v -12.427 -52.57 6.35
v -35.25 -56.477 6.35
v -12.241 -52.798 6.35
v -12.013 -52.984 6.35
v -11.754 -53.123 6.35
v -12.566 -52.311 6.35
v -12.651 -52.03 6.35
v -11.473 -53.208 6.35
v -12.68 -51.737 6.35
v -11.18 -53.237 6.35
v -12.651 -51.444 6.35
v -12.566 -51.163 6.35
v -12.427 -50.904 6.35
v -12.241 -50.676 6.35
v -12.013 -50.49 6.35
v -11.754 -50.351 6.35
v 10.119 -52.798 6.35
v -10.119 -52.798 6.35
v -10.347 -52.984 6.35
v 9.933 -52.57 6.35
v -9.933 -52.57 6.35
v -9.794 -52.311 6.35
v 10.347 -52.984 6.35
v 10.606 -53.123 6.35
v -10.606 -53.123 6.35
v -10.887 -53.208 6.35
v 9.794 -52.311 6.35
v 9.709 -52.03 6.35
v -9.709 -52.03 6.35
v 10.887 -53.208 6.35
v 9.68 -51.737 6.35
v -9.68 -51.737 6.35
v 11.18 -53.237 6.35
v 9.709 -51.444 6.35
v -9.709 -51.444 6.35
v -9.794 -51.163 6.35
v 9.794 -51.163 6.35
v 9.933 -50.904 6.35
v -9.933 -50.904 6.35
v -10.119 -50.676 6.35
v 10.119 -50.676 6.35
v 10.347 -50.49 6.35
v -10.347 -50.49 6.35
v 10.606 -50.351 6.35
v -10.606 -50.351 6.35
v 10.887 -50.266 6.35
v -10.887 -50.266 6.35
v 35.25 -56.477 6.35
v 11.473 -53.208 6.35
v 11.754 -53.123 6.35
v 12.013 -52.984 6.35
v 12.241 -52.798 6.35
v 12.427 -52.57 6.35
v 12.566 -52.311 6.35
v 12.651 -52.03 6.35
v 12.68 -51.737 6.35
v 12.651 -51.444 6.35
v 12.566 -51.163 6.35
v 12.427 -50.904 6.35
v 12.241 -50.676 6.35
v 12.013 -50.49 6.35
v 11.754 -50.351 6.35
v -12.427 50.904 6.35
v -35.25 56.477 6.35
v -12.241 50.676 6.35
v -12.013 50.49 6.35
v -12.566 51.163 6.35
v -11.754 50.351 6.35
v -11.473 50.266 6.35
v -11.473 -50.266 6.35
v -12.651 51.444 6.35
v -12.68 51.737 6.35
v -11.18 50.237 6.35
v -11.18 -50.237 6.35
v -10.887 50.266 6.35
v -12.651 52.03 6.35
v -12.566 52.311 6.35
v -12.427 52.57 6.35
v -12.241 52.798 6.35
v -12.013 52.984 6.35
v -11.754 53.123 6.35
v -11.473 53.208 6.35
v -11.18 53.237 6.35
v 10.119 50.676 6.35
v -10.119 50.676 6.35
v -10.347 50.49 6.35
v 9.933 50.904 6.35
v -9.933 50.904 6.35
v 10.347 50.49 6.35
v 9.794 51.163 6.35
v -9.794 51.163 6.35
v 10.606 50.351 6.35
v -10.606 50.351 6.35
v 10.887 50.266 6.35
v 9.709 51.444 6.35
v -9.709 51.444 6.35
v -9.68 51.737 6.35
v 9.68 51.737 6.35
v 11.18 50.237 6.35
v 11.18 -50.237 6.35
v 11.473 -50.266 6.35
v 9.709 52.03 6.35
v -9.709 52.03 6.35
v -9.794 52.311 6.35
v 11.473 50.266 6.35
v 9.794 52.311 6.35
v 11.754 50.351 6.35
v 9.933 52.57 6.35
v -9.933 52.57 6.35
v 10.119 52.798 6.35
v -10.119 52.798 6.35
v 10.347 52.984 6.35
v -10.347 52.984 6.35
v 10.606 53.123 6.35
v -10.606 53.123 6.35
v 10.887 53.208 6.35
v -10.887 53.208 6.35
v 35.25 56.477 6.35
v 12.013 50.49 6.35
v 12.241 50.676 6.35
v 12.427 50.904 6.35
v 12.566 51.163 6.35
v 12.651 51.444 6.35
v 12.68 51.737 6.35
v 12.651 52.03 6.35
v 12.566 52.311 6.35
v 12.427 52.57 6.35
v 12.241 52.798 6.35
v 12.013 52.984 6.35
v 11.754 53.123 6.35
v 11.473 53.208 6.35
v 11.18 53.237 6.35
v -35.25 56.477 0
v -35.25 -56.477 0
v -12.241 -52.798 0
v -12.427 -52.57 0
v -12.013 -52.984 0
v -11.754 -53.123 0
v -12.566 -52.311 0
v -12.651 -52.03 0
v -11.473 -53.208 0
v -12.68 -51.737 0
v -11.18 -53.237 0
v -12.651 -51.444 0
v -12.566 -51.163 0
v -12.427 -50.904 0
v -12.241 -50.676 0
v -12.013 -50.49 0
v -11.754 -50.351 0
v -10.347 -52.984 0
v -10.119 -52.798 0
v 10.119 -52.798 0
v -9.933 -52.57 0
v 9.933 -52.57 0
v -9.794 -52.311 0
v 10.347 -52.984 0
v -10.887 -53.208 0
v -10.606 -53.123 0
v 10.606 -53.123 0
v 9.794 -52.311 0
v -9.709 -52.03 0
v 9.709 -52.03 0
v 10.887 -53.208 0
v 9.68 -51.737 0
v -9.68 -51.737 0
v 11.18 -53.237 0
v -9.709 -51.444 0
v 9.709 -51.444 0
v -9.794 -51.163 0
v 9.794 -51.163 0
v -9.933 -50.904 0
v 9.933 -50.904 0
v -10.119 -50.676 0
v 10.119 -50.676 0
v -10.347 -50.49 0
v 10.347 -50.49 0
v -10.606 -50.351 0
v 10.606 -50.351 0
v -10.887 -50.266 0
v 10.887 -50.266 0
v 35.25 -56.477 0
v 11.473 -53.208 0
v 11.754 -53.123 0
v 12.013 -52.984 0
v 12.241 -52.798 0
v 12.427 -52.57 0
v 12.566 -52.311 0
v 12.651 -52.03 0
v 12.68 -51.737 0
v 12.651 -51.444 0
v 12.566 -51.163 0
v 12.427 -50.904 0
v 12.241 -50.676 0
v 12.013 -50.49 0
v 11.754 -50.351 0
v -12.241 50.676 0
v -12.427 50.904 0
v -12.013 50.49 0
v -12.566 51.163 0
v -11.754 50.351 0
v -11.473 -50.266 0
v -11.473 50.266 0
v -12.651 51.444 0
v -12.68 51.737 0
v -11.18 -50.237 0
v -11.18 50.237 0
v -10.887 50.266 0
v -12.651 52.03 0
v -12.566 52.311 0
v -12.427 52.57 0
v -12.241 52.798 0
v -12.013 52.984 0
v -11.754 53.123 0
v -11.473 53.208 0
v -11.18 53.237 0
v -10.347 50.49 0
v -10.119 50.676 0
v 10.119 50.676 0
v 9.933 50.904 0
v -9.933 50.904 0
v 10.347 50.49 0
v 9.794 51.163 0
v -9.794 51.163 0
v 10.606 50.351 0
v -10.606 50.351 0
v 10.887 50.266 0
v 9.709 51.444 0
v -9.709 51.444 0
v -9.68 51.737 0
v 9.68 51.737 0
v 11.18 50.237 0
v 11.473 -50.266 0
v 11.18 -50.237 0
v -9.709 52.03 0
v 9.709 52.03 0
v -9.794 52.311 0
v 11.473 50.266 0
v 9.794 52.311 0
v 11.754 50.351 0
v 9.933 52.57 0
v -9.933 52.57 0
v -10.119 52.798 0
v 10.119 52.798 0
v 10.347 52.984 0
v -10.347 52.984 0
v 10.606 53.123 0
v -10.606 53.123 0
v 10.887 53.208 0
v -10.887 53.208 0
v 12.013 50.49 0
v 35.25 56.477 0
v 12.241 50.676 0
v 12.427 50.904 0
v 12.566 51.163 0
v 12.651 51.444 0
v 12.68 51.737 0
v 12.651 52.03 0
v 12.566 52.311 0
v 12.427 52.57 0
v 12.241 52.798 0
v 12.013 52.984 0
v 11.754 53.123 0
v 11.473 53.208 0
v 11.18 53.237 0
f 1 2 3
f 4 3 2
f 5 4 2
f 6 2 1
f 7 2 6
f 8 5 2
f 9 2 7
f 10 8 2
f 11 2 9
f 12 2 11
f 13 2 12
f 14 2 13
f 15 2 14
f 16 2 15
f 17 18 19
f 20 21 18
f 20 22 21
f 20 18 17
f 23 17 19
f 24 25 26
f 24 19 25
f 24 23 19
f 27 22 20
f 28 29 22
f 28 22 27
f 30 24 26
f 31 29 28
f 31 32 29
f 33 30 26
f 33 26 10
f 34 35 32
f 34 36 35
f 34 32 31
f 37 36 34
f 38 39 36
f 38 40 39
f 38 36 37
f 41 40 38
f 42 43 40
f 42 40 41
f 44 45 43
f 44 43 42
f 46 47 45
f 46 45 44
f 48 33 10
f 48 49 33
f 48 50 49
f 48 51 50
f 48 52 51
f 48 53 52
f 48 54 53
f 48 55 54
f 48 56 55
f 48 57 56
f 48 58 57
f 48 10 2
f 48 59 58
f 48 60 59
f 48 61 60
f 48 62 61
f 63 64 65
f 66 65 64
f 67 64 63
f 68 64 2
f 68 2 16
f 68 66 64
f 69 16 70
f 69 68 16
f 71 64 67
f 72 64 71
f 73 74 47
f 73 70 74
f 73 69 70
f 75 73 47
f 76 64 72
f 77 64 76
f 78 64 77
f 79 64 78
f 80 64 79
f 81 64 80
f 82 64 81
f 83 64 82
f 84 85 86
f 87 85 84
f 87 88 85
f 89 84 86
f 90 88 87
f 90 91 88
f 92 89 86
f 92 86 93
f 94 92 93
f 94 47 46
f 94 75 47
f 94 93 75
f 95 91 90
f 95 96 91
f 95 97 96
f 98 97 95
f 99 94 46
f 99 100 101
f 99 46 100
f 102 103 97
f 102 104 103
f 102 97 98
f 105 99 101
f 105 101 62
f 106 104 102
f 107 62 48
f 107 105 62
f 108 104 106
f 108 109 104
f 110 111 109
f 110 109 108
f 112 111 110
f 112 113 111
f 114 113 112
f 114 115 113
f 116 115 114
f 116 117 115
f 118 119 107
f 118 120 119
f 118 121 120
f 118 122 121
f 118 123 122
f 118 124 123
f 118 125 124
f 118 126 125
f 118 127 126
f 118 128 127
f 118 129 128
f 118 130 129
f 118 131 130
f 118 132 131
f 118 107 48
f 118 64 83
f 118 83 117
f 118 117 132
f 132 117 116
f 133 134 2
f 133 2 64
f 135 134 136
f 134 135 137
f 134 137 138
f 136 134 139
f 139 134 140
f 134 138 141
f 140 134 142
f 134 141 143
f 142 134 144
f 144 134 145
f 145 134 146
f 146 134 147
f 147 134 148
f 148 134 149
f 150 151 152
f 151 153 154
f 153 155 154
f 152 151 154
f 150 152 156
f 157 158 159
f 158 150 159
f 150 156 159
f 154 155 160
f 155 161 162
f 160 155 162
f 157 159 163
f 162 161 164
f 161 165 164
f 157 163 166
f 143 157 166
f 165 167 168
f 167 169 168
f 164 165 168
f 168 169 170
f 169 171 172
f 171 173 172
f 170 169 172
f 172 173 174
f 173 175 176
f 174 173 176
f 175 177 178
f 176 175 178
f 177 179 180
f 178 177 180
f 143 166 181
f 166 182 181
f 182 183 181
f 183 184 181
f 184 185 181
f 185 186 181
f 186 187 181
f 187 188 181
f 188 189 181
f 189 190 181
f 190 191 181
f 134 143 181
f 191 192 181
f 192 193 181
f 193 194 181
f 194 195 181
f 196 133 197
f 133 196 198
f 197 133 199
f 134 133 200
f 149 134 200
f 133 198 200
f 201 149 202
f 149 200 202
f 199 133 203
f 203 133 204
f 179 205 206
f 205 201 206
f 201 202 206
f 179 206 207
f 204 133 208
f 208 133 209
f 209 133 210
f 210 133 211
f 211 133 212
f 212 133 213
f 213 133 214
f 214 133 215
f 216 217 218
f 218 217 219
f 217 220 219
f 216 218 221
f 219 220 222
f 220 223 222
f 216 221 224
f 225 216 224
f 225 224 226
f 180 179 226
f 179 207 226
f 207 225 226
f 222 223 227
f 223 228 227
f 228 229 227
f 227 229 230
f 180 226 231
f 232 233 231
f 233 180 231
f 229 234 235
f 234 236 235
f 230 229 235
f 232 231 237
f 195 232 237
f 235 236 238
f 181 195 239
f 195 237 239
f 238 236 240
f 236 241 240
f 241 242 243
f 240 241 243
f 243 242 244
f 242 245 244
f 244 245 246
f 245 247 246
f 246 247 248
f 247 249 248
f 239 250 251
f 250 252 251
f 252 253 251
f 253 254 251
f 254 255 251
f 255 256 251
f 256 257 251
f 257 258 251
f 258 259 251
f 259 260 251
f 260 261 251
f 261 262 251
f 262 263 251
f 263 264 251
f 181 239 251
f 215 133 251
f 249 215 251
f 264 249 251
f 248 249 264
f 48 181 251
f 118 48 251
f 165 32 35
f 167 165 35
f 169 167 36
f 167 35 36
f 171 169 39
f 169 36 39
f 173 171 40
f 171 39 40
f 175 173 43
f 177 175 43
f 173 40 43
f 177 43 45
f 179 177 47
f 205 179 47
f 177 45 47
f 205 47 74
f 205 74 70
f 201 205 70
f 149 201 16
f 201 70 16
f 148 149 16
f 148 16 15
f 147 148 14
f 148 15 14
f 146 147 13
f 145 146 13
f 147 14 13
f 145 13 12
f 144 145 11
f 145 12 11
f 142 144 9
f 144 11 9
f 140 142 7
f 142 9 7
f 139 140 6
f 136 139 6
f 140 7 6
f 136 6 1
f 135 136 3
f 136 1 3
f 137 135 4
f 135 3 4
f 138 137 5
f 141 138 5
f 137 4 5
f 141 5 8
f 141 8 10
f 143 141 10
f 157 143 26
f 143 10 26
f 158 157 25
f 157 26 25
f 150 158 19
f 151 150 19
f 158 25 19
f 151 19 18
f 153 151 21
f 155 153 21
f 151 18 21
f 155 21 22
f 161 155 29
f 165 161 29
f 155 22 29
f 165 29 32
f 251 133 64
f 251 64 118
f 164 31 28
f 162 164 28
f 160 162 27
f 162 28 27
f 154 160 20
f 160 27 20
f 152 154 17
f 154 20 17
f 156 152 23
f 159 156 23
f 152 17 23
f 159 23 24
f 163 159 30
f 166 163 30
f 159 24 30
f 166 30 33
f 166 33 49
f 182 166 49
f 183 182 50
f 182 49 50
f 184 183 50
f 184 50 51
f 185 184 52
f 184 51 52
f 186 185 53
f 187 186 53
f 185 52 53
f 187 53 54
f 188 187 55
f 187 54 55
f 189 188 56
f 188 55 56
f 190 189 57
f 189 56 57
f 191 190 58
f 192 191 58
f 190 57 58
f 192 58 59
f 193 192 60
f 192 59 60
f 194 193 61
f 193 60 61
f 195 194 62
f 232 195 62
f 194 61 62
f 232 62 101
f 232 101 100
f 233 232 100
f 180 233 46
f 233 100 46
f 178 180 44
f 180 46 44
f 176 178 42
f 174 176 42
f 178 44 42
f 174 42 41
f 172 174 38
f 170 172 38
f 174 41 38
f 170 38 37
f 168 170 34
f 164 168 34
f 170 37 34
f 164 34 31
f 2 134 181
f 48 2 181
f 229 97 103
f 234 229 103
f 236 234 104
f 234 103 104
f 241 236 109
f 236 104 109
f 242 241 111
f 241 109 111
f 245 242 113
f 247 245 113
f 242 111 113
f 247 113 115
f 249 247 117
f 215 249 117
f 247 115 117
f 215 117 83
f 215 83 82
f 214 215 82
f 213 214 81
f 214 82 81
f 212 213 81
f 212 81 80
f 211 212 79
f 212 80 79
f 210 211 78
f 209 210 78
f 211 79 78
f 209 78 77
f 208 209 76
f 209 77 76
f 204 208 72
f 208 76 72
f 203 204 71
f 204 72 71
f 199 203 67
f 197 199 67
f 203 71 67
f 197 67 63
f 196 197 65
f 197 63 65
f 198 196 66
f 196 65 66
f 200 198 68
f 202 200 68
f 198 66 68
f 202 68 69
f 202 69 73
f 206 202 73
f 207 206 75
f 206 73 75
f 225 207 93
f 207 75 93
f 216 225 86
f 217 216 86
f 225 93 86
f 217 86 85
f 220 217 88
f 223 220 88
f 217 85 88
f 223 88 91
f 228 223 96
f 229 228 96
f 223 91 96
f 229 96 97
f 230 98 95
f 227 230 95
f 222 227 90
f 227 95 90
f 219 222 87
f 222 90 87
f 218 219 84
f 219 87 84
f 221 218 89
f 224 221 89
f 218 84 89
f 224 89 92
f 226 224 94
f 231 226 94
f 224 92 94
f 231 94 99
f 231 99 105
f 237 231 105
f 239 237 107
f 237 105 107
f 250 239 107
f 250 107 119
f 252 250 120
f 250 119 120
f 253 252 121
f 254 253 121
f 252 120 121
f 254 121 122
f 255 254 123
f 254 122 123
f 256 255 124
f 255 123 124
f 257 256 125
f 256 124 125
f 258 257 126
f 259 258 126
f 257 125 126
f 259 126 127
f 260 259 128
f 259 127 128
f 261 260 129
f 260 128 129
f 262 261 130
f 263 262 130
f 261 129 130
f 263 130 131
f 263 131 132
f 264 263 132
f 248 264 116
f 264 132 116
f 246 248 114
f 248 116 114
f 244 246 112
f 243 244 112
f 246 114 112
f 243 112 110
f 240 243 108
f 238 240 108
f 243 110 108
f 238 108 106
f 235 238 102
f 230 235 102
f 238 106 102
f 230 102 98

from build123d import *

# Parameters (mm, degrees)
F0_W     = 70.5
F0_H     = 112.9538
F1_DEPTH = 6.35
F2_R     = 1.5
F3_DEPTH = 6.35


with BuildPart() as f1:
    # F0 (on Top) → F1 (new body)
    with BuildSketch(Plane.XY):
        Rectangle(F0_W, F0_H)
    extrude(amount=F1_DEPTH)

    # F2 (on face) → F3 (cut, through all)
    with BuildSketch(Plane.XY.offset(6.35)):
        with BuildLine():
            ThreePointArc((12.68, -51.7369), (11.18, -50.2369), (9.68, -51.7369))
            ThreePointArc((9.68, -51.7369), (11.18, -53.2369), (12.68, -51.7369))
        make_face()
        with Locations((-11.18, -51.7369)):
            Circle(F2_R)
        with BuildLine():
            ThreePointArc((12.68, 51.7369), (11.18, 53.2369), (9.68, 51.7369))
            ThreePointArc((9.68, 51.7369), (11.18, 50.2369), (12.68, 51.7369))
        make_face()
        with Locations((-11.18, 51.7369)):
            Circle(F2_R)
    extrude(amount=-F3_DEPTH, mode=Mode.SUBTRACT)


solid = f1.part
